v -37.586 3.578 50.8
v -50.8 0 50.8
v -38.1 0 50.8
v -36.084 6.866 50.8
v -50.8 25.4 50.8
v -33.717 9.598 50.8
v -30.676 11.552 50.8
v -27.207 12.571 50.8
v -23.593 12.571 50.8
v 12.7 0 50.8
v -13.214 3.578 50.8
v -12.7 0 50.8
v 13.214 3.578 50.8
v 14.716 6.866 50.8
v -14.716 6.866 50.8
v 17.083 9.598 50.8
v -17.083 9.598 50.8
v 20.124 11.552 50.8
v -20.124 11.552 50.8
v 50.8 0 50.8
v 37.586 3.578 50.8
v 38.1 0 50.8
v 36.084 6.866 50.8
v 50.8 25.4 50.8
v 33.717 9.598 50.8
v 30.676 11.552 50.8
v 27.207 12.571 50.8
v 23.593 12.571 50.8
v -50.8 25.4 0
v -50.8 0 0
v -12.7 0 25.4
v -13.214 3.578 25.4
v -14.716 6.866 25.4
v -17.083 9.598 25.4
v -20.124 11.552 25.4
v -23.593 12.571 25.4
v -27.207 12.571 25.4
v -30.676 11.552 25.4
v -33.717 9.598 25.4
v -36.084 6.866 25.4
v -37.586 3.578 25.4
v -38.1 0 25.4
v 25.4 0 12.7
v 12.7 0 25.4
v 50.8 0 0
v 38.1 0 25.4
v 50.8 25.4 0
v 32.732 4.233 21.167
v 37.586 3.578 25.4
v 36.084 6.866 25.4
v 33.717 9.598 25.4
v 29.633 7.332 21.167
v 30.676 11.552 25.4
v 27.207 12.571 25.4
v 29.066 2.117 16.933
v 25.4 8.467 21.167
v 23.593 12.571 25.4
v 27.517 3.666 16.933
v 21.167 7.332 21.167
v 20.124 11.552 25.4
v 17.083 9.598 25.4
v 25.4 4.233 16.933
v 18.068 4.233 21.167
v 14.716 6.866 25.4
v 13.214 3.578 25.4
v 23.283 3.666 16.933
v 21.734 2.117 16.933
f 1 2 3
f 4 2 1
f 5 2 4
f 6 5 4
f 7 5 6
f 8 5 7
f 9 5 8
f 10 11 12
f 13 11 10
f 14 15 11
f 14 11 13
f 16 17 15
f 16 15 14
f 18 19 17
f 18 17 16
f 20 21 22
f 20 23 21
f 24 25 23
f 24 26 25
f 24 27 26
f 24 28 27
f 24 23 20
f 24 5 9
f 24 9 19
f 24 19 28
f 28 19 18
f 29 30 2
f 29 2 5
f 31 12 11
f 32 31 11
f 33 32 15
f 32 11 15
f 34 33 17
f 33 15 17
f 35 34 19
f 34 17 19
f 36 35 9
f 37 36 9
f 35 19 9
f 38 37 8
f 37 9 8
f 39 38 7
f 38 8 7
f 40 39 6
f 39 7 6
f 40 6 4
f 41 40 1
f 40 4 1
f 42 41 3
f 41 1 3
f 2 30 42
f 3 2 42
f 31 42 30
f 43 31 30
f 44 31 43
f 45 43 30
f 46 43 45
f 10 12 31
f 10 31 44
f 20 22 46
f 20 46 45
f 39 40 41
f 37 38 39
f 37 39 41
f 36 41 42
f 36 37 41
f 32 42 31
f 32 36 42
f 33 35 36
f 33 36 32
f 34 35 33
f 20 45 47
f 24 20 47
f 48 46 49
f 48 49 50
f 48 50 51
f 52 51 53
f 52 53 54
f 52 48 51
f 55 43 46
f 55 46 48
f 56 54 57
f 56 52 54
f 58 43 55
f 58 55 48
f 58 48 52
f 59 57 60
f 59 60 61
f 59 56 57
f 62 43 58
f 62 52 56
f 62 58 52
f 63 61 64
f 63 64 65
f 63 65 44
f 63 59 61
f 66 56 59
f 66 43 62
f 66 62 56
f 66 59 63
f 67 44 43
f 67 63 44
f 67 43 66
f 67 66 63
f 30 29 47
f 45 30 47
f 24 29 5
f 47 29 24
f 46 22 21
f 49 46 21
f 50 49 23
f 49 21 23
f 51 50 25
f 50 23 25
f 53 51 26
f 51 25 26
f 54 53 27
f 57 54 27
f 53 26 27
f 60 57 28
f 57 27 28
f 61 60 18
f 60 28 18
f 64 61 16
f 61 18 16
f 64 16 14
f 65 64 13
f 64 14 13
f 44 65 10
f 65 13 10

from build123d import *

# Parameters (mm, degrees)
F0_W     = 101.6
F0_H     = 50.8
F1_DEPTH = 50.8
F2_R     = 12.7
F3_DEPTH = 25.4
F5_R     = 12.7
F4_W     = 101.6
F4_H     = 25.4
F7_DEPTH = 50.8


# Not quite as in the source:
# - an extrude whose draft closes it to a point is written as a loft to that point


with BuildPart() as f1:
    # F0 (on Top) → F1 (new body)
    with BuildSketch(Plane.XY):
        Rectangle(F0_W, F0_H)
    extrude(amount=F1_DEPTH)

    # F2 (on face) → F3 (cut)
    with BuildSketch(Plane.XY.offset(50.8)):
        with Locations((-25.4, 0)):
            Circle(F2_R)
        with Locations((25.4, 0)):
            Circle(F2_R)
    extrude(amount=-F3_DEPTH, mode=Mode.SUBTRACT)

    # F5 (on face) → F6 section 0
    with BuildSketch(Plane.XY.offset(25.4), mode=Mode.PRIVATE) as f6_s0:
        with Locations((25.4, 0)):
            Circle(F5_R)
    loft([f6_s0.sketch, Vertex(25.4, 0, 12.7)], ruled=True, mode=Mode.SUBTRACT)

    # F4 (on face) → F7 (cut, through all)
    with BuildSketch(Plane.XY.offset(50.8)):
        with Locations((0, -12.7)):
            Rectangle(F4_W, F4_H)
    extrude(amount=-F7_DEPTH, mode=Mode.SUBTRACT)


solid = f1.part
